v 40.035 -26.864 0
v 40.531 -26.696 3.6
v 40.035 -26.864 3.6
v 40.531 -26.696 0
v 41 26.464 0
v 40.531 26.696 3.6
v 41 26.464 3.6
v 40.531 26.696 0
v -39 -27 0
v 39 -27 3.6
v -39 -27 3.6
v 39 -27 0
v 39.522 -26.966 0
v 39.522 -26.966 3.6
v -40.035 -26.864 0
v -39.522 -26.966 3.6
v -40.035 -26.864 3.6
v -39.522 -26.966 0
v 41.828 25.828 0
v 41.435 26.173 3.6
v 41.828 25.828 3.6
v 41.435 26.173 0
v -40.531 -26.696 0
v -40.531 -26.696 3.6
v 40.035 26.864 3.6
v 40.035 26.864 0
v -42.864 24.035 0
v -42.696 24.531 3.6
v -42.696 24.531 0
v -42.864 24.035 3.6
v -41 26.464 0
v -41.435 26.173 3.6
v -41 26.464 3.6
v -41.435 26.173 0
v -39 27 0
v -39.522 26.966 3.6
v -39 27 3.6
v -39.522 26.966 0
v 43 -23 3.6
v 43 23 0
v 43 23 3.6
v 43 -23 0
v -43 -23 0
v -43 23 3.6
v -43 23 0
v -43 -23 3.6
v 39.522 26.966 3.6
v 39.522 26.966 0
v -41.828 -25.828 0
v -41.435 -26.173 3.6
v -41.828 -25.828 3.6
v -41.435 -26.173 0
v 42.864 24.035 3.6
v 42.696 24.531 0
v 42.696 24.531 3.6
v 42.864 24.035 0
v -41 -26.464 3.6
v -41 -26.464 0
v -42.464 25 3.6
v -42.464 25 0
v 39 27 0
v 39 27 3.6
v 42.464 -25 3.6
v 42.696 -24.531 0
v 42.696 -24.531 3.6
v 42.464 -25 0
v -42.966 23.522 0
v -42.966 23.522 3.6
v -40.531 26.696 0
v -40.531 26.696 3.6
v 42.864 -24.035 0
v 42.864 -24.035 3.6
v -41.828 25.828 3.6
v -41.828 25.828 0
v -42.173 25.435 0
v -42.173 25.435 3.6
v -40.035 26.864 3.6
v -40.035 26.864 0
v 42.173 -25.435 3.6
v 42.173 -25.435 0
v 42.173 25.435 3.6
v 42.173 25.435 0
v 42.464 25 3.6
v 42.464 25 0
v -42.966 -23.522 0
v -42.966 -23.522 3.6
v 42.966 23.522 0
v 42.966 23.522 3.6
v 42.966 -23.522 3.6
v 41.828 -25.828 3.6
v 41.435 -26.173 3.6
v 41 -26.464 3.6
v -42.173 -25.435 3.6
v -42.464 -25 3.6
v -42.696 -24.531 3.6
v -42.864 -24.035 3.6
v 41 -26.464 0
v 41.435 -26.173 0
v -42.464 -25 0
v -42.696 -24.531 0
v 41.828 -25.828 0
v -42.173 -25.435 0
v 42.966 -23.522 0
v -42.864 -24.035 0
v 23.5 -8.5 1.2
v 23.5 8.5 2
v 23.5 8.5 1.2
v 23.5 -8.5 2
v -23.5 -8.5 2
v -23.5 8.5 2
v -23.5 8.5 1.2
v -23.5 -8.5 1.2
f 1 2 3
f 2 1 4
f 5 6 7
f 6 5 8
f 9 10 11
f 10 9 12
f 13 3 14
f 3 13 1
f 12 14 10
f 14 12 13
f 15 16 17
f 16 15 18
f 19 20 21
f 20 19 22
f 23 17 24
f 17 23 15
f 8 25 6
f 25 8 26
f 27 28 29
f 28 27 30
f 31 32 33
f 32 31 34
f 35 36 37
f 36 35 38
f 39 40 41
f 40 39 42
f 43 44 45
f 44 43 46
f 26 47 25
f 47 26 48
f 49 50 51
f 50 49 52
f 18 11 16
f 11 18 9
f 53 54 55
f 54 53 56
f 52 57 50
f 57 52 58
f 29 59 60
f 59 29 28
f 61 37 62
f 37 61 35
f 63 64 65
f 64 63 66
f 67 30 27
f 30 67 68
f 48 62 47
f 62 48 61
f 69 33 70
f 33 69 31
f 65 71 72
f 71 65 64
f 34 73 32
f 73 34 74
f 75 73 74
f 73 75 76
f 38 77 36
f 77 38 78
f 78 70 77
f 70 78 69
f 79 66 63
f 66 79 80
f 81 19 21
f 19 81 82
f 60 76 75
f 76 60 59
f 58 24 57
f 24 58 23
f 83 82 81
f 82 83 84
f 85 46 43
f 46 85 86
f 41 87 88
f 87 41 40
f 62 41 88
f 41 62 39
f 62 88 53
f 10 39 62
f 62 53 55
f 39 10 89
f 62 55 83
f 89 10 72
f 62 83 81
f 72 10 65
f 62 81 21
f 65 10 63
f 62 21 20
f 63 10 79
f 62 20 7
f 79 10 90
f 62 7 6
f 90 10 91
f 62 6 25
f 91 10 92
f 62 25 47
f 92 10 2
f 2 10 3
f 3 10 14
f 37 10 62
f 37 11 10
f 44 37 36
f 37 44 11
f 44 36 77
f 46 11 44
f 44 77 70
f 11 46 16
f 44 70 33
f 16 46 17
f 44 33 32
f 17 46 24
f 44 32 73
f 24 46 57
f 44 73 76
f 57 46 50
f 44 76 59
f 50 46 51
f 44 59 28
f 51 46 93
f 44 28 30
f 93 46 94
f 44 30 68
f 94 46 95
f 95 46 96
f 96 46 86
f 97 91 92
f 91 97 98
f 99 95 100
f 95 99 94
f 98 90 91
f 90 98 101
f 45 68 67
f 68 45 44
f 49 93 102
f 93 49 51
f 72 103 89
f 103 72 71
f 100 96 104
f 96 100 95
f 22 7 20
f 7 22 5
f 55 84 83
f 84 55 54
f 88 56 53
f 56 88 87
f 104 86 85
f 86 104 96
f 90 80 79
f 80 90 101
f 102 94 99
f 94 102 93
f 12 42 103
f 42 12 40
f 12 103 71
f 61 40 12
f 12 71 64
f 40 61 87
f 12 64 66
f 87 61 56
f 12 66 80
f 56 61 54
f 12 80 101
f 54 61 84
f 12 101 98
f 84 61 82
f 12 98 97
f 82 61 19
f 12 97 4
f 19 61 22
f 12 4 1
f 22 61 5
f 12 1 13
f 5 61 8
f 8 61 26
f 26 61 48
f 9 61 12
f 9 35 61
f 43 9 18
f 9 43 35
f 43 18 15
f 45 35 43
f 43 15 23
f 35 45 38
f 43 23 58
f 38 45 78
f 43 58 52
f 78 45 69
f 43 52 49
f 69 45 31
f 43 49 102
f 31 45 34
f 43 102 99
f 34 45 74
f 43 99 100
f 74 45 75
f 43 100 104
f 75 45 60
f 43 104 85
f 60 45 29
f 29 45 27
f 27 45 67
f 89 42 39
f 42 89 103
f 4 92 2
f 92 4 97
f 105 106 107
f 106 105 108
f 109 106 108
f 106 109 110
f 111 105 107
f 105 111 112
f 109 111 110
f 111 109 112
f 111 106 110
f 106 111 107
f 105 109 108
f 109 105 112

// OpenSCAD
// Tarjeta NFC para reseñas de Google — Flashforge AD5X
// Abre en OpenSCAD (https://openscad.org) y pulsa F6 para exportar STL.
// Cambia los parámetros en el Customizer (panel izquierdo).

/* [Tarjeta] */
ancho = 86;          // mm  (tamaño tarjeta de crédito)
alto  = 54;
grosor = 3.6;
radio = 4;

/* [NFC] */
// tira = rectangular; moneda = circular 25/30 mm
nfc_tipo = "tira";   // [tira, moneda]
nfc_tira_w = 47;
nfc_tira_h = 17;
nfc_moneda_d = 26.5;
nfc_grosor = 0.8;
nfc_desde_base = 1.2;  // deja 6 capas de 0.2 mm debajo

/* [Pieza a generar] */
pieza = "cuerpo";    // [cuerpo, estrellas, texto, icono, soporte, ensamblado]

/* [Texto] */
linea1 = "TOCA PARA";
linea2 = "RESENA";

$fn = 48;

module tarjeta_redondeada(w, h, r, t) {
    linear_extrude(t)
        offset(r=r)
            square([w - 2*r, h - 2*r], center=true);
}

module hueco_nfc() {
    translate([0, 0, nfc_desde_base])
        if (nfc_tipo == "moneda")
            cylinder(h=nfc_grosor, d=nfc_moneda_d);
        else
            translate([0, 0, nfc_grosor/2])
                cube([nfc_tira_w, nfc_tira_h, nfc_grosor], center=true);
}

module cuerpo() {
    difference() {
        tarjeta_redondeada(ancho, alto, radio, grosor);
        hueco_nfc();
    }
}

module estrella(r=3.6) {
    points = [for (i = [0:9])
        let(a = i * 36 - 90, rr = i % 2 == 0 ? r : r * 0.42)
        [rr * cos(a), rr * sin(a)]
    ];
    linear_extrude(0.4) polygon(points);
}

module estrellas() {
    translate([0, 0, grosor])
        for (i = [-2:2])
            translate([i * 9, alto/2 - 10, 0])
                estrella();
}

module textos() {
    translate([6, 4.5, grosor])
        linear_extrude(0.4)
            text(linea1, size=5.5, font="Liberation Sans:style=Bold",
                 halign="center", valign="center");
    translate([6, -6.5, grosor])
        linear_extrude(0.4)
            text(linea2, size=7.5, font="Liberation Sans:style=Bold",
                 halign="center", valign="center");
}

module icono() {
    translate([-ancho/2 + 14, 0, grosor]) {
        difference() {
            cylinder(h=0.4, r=8.2);
            translate([0, 0, -0.1]) cylinder(h=0.6, r=6.6);
        }
        estrella(4.4);
    }
}

module soporte() {
    base_w = ancho + 8;
    base_d = 28;
    translate([0, 0, 0])
        linear_extrude(3)
            offset(r=3) square([base_w - 6, base_d - 6], center=true);
    translate([0, -base_d/2 + 8, 0])
        cube([base_w, 10, alto * 0.55], center=false);
}

if (pieza == "cuerpo")      cuerpo();
else if (pieza == "estrellas") estrellas();
else if (pieza == "texto")   textos();
else if (pieza == "icono")   icono();
else if (pieza == "soporte") soporte();
else {
    color("#222") cuerpo();
    color("#F4C430") estrellas();
    color("#FFF") textos();
    color("#FFF") icono();
}
